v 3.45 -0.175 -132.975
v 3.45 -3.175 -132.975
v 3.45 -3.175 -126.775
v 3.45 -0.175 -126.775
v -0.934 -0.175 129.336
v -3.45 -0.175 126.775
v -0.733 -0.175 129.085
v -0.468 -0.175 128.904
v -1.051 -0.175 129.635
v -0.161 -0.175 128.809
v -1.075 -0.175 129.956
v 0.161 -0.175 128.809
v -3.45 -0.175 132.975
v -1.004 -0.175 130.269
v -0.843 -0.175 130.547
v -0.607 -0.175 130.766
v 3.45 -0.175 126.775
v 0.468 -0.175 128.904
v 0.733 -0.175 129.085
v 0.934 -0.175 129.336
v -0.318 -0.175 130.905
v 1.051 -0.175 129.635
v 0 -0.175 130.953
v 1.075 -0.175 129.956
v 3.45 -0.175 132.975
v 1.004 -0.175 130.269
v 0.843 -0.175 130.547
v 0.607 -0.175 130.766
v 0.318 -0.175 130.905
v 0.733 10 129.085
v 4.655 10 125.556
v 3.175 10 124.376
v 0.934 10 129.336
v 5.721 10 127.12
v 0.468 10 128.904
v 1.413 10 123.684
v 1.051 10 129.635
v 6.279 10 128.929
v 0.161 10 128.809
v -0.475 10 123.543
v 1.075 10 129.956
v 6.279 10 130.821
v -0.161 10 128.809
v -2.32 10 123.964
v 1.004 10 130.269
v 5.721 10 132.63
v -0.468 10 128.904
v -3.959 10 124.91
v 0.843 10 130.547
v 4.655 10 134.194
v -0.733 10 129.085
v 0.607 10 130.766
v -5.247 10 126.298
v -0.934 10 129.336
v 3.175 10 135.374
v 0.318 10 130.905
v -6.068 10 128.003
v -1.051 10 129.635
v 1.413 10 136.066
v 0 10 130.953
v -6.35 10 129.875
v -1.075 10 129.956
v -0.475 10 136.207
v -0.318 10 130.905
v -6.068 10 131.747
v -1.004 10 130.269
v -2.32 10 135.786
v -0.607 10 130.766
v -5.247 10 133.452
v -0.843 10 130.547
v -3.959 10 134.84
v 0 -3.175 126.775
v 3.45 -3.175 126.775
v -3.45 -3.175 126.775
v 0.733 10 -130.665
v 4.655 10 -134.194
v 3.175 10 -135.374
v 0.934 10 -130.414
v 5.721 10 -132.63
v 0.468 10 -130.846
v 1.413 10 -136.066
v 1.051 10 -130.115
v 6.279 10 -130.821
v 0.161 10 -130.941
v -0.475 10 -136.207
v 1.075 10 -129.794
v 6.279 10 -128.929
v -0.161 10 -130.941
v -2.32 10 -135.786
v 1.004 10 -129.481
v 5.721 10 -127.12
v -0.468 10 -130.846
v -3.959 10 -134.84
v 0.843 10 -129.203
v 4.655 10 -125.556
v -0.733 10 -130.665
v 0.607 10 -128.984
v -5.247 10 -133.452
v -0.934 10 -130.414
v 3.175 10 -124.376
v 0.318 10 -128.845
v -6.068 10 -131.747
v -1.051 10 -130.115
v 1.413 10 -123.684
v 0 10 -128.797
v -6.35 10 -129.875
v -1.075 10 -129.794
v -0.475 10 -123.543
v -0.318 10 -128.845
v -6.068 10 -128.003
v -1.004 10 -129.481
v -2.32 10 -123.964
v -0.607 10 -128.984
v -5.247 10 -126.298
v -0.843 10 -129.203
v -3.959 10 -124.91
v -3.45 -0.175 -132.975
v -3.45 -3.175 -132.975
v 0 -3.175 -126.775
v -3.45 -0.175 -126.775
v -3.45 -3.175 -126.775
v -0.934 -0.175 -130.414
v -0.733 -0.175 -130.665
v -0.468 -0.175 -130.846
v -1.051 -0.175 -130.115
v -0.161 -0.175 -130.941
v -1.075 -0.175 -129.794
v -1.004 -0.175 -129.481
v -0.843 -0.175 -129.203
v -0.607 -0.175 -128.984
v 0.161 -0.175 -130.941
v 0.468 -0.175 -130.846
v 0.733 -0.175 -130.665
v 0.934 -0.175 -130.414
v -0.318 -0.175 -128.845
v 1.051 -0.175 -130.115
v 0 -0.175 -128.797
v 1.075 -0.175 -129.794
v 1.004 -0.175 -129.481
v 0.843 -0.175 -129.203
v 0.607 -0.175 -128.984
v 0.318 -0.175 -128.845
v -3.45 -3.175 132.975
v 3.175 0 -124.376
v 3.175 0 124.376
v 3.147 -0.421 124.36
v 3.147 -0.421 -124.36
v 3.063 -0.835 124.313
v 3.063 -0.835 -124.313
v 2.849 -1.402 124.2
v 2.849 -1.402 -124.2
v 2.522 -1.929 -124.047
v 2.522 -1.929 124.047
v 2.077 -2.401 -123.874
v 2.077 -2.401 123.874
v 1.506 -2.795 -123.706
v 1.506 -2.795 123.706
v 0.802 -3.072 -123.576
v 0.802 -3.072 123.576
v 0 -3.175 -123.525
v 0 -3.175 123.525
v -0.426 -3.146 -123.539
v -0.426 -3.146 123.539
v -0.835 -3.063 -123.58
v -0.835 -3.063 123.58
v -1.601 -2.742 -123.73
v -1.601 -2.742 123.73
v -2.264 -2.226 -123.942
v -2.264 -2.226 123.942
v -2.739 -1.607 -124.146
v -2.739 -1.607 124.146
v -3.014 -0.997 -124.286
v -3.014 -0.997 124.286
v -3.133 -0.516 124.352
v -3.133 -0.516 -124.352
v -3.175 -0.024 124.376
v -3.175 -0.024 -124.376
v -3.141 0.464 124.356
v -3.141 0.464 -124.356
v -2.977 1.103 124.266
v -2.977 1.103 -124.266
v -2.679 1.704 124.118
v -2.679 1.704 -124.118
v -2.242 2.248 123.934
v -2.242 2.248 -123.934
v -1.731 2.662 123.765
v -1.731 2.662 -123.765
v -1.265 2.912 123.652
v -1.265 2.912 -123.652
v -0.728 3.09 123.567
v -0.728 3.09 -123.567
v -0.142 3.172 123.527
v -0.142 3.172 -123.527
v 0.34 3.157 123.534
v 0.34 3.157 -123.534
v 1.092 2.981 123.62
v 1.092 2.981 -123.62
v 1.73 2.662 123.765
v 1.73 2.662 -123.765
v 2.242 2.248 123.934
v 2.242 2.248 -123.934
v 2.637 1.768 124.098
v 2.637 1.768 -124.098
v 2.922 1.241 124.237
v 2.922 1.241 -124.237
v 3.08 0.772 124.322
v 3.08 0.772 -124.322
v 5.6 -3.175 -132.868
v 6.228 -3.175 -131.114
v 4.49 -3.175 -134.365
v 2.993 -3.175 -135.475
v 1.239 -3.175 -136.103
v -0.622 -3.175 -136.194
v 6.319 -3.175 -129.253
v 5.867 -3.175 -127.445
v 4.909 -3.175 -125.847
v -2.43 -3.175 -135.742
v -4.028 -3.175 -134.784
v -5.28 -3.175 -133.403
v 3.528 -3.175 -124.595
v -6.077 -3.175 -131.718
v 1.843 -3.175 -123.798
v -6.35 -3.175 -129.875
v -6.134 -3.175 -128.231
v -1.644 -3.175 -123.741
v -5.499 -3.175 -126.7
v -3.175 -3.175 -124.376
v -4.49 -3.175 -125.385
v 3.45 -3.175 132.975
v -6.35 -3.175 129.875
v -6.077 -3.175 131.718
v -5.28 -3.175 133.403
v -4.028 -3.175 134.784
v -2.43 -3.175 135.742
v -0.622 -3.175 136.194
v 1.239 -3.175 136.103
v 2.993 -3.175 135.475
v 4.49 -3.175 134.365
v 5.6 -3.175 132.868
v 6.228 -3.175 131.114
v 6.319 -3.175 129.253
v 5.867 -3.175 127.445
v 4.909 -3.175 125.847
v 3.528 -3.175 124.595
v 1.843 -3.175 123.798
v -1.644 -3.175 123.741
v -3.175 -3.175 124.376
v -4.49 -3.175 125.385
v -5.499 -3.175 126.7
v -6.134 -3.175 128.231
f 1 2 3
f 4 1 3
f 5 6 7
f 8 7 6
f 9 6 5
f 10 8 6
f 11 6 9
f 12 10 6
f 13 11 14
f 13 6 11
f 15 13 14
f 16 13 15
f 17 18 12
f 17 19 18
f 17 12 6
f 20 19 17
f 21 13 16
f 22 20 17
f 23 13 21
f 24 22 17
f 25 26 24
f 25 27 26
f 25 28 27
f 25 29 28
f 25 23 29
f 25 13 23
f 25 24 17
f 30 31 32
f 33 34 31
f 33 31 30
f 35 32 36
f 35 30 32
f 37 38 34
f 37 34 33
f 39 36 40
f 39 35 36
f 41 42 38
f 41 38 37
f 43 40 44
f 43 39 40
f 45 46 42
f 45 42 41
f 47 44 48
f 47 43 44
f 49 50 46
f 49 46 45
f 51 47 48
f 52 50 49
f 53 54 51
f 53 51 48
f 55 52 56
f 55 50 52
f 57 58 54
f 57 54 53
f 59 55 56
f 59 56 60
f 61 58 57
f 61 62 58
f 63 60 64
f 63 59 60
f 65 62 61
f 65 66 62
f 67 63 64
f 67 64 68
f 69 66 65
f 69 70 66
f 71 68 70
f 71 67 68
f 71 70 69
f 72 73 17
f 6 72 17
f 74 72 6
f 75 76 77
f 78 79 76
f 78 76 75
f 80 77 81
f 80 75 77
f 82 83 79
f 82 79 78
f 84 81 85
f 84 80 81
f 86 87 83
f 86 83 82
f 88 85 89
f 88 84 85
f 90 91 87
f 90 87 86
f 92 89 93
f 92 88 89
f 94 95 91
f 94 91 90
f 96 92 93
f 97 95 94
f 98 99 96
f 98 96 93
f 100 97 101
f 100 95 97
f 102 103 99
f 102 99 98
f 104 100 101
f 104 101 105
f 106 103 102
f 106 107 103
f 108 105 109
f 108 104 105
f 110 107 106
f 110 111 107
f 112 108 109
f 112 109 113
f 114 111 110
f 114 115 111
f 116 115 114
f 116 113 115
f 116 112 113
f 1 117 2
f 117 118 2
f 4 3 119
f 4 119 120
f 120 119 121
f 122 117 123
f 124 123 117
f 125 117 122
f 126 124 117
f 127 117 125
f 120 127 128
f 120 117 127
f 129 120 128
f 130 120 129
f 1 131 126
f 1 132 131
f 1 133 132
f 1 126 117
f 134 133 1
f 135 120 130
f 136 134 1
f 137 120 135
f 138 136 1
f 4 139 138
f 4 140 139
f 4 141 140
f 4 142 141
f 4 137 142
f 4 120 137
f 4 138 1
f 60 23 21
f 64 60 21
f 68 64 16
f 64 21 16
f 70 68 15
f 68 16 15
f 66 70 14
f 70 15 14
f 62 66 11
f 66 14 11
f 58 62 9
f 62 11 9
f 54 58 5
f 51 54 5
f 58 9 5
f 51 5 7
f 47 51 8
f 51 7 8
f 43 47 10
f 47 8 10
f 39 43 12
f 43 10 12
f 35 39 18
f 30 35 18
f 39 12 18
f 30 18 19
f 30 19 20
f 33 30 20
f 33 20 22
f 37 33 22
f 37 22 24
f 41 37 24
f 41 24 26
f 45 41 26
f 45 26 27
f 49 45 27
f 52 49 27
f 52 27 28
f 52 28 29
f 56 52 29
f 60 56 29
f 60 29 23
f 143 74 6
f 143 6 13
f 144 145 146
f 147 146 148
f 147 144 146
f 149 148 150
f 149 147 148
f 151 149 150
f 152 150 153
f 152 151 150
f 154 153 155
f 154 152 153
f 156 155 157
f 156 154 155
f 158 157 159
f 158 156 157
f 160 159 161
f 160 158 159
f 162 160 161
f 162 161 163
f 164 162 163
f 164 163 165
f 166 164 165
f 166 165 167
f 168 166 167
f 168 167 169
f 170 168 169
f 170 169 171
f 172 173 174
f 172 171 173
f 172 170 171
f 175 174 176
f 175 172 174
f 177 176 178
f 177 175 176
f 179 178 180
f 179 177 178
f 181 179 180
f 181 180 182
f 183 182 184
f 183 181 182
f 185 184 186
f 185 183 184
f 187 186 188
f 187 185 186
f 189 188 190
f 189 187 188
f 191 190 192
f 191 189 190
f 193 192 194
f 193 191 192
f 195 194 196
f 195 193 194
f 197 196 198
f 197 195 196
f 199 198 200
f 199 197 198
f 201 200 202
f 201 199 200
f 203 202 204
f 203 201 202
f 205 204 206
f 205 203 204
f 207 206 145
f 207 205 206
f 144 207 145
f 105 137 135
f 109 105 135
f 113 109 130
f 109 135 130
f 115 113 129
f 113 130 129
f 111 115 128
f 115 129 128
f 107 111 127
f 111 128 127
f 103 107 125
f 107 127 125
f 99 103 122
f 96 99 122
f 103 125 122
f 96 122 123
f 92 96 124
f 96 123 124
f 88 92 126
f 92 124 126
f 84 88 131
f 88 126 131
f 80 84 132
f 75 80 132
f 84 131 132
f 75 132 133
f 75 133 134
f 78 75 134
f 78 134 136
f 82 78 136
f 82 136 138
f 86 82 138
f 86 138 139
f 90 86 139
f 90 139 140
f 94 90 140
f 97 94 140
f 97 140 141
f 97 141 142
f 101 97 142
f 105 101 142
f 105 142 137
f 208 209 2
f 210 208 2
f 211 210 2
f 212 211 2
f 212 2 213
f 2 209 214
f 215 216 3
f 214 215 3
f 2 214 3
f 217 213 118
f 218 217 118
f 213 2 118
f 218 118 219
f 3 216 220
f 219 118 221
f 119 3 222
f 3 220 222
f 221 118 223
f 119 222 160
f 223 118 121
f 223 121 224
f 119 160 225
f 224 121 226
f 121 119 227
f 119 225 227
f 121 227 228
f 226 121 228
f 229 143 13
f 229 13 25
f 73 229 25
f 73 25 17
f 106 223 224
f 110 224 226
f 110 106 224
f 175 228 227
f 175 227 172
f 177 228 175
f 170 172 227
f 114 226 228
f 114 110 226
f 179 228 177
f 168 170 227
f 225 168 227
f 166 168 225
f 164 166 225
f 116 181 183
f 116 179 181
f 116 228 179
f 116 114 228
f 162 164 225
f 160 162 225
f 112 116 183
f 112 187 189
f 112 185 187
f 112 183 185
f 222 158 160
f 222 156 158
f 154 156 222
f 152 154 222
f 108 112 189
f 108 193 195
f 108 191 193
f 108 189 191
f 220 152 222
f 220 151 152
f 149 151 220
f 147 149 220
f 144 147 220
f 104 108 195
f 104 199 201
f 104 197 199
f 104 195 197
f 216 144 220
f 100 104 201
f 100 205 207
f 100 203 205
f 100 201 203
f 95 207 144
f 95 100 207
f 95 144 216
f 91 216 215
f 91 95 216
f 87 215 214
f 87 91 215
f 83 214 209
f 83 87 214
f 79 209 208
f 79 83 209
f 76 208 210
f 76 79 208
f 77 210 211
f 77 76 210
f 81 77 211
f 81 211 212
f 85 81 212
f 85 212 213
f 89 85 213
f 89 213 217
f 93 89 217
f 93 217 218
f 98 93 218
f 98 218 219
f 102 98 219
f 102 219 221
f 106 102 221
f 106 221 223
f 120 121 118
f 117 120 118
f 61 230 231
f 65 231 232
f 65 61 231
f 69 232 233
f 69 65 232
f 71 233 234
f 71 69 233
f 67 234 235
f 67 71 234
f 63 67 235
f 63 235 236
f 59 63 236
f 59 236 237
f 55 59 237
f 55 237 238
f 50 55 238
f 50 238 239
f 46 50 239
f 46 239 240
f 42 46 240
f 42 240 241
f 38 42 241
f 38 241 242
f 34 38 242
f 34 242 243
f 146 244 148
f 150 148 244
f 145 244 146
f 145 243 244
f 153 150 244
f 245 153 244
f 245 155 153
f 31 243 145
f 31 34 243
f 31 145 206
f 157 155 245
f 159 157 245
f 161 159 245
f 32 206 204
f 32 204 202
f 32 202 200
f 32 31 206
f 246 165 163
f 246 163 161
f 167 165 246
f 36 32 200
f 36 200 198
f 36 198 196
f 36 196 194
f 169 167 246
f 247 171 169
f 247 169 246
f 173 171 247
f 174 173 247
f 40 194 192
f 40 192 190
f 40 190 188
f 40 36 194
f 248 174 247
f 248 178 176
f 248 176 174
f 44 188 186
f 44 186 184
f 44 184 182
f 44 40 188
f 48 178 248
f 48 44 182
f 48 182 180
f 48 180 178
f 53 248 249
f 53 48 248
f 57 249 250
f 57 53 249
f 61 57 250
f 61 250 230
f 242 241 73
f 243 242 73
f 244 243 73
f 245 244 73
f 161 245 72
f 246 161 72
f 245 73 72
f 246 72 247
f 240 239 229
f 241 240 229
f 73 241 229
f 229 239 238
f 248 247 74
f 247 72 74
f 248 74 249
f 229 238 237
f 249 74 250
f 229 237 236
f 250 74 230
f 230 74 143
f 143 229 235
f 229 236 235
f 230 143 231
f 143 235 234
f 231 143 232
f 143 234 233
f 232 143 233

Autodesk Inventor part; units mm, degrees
ref_plane "YZ Plane" through (0, 0, 0) normal (1, 0, 0) x (0, 1, 0)
ref_plane "XZ Plane" through (0, 0, 0) normal (0, 1, 0) x (-1, 0, 0)
ref_plane "XY Plane" through (0, 0, 0) normal (0, 0, 1) x (1, 0, 0)
sketch "Sketch1" plane through (0, 0, 0) normal (0, 0, 1) x (1, 0, 0)
  circle A0 centre (0, 0) radius 3.175
  dimension "d0" = 6.35
extrude "Extrusion1" add sketch "Sketch1" along normal mid plane 259
sketch "Sketch2" plane through (0, 0, 0) normal (0, 1, 0) x (-1, 0, 0)
  circle A0 centre (0, 129.875) radius 6.35
  circle A1 centre (0, -129.875) radius 6.35
  line L0 (-3.175, -129.5) -> (-3.175, 129.5) projected
  line L1 (-3.175, 0) -> (16.7407, 0)
  point P0 (3.175, -105.625)
  dimension "d4" = 259.75
  dimension "d5" = 129.875
  dimension "d6" = 12.7
  dimension "d7" = 12.7
extrude "Extrusion2" add sketch "Sketch2" along normal blind 10 and the other way blind 3.175
sketch "Sketch3" plane through (0, 10, 129.875) normal (0, 1, 0) x (1, 0, 0)
  circle A0 centre (0, 0) radius 6.35 projected
  circle A1 centre (0, 259.75) radius 6.35 projected
  point P0 (0, 129.875)
hole "Hole1" at (0, 10, 129.875) at (0, 10, -129.875) direction (0, -1, 0) diameter 2.1565 end through all thread size "4-40 UNC" class "2B" standard "ANSI Unified Screw Threads"
sketch "Sketch9" plane through (0, -3.175, 129.875) normal (0, -1, 0) x (1, 0, 0)
  line L0 (-3.45, 3.1) -> (3.45, 3.1)
  line L1 (3.45, 3.1) -> (3.45, -3.1)
  line L2 (3.45, -3.1) -> (-3.45, -3.1)
  line L3 (-3.45, -3.1) -> (-3.45, 3.1)
  line L4 (-3.45, 3.1) -> (3.45, -3.1) construction
  line L5 (3.45, 3.1) -> (-3.45, -3.1) construction
  line L6 (0, -129.875) -> (-12.946, -129.875)
  line L7 (-3.45, -262.85) -> (3.45, -262.85)
  line L8 (3.45, -262.85) -> (3.45, -256.65)
  line L9 (3.45, -256.65) -> (-3.45, -256.65)
  line L10 (-3.45, -256.65) -> (-3.45, -262.85)
  point P0 (0, 0)
  dimension "d28" = 6.9
  dimension "d29" = 6.2
extrude "Extrusion6" cut sketch "Sketch9" against normal blind 3
properties part number "Solar_Panel_Bar"
